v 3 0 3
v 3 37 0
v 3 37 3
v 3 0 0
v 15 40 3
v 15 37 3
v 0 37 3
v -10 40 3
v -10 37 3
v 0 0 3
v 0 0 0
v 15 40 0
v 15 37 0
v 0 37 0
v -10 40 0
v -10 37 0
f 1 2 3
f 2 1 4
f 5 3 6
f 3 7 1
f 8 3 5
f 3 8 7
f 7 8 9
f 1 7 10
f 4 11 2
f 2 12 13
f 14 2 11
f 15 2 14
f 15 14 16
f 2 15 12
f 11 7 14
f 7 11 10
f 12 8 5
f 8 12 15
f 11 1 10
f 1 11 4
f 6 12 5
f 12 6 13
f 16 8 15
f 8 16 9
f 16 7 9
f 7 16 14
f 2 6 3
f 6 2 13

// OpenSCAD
union(){ 
cube([3,40,3]);
 translate([-10,37,0]) cube([25,3,3]);
}
